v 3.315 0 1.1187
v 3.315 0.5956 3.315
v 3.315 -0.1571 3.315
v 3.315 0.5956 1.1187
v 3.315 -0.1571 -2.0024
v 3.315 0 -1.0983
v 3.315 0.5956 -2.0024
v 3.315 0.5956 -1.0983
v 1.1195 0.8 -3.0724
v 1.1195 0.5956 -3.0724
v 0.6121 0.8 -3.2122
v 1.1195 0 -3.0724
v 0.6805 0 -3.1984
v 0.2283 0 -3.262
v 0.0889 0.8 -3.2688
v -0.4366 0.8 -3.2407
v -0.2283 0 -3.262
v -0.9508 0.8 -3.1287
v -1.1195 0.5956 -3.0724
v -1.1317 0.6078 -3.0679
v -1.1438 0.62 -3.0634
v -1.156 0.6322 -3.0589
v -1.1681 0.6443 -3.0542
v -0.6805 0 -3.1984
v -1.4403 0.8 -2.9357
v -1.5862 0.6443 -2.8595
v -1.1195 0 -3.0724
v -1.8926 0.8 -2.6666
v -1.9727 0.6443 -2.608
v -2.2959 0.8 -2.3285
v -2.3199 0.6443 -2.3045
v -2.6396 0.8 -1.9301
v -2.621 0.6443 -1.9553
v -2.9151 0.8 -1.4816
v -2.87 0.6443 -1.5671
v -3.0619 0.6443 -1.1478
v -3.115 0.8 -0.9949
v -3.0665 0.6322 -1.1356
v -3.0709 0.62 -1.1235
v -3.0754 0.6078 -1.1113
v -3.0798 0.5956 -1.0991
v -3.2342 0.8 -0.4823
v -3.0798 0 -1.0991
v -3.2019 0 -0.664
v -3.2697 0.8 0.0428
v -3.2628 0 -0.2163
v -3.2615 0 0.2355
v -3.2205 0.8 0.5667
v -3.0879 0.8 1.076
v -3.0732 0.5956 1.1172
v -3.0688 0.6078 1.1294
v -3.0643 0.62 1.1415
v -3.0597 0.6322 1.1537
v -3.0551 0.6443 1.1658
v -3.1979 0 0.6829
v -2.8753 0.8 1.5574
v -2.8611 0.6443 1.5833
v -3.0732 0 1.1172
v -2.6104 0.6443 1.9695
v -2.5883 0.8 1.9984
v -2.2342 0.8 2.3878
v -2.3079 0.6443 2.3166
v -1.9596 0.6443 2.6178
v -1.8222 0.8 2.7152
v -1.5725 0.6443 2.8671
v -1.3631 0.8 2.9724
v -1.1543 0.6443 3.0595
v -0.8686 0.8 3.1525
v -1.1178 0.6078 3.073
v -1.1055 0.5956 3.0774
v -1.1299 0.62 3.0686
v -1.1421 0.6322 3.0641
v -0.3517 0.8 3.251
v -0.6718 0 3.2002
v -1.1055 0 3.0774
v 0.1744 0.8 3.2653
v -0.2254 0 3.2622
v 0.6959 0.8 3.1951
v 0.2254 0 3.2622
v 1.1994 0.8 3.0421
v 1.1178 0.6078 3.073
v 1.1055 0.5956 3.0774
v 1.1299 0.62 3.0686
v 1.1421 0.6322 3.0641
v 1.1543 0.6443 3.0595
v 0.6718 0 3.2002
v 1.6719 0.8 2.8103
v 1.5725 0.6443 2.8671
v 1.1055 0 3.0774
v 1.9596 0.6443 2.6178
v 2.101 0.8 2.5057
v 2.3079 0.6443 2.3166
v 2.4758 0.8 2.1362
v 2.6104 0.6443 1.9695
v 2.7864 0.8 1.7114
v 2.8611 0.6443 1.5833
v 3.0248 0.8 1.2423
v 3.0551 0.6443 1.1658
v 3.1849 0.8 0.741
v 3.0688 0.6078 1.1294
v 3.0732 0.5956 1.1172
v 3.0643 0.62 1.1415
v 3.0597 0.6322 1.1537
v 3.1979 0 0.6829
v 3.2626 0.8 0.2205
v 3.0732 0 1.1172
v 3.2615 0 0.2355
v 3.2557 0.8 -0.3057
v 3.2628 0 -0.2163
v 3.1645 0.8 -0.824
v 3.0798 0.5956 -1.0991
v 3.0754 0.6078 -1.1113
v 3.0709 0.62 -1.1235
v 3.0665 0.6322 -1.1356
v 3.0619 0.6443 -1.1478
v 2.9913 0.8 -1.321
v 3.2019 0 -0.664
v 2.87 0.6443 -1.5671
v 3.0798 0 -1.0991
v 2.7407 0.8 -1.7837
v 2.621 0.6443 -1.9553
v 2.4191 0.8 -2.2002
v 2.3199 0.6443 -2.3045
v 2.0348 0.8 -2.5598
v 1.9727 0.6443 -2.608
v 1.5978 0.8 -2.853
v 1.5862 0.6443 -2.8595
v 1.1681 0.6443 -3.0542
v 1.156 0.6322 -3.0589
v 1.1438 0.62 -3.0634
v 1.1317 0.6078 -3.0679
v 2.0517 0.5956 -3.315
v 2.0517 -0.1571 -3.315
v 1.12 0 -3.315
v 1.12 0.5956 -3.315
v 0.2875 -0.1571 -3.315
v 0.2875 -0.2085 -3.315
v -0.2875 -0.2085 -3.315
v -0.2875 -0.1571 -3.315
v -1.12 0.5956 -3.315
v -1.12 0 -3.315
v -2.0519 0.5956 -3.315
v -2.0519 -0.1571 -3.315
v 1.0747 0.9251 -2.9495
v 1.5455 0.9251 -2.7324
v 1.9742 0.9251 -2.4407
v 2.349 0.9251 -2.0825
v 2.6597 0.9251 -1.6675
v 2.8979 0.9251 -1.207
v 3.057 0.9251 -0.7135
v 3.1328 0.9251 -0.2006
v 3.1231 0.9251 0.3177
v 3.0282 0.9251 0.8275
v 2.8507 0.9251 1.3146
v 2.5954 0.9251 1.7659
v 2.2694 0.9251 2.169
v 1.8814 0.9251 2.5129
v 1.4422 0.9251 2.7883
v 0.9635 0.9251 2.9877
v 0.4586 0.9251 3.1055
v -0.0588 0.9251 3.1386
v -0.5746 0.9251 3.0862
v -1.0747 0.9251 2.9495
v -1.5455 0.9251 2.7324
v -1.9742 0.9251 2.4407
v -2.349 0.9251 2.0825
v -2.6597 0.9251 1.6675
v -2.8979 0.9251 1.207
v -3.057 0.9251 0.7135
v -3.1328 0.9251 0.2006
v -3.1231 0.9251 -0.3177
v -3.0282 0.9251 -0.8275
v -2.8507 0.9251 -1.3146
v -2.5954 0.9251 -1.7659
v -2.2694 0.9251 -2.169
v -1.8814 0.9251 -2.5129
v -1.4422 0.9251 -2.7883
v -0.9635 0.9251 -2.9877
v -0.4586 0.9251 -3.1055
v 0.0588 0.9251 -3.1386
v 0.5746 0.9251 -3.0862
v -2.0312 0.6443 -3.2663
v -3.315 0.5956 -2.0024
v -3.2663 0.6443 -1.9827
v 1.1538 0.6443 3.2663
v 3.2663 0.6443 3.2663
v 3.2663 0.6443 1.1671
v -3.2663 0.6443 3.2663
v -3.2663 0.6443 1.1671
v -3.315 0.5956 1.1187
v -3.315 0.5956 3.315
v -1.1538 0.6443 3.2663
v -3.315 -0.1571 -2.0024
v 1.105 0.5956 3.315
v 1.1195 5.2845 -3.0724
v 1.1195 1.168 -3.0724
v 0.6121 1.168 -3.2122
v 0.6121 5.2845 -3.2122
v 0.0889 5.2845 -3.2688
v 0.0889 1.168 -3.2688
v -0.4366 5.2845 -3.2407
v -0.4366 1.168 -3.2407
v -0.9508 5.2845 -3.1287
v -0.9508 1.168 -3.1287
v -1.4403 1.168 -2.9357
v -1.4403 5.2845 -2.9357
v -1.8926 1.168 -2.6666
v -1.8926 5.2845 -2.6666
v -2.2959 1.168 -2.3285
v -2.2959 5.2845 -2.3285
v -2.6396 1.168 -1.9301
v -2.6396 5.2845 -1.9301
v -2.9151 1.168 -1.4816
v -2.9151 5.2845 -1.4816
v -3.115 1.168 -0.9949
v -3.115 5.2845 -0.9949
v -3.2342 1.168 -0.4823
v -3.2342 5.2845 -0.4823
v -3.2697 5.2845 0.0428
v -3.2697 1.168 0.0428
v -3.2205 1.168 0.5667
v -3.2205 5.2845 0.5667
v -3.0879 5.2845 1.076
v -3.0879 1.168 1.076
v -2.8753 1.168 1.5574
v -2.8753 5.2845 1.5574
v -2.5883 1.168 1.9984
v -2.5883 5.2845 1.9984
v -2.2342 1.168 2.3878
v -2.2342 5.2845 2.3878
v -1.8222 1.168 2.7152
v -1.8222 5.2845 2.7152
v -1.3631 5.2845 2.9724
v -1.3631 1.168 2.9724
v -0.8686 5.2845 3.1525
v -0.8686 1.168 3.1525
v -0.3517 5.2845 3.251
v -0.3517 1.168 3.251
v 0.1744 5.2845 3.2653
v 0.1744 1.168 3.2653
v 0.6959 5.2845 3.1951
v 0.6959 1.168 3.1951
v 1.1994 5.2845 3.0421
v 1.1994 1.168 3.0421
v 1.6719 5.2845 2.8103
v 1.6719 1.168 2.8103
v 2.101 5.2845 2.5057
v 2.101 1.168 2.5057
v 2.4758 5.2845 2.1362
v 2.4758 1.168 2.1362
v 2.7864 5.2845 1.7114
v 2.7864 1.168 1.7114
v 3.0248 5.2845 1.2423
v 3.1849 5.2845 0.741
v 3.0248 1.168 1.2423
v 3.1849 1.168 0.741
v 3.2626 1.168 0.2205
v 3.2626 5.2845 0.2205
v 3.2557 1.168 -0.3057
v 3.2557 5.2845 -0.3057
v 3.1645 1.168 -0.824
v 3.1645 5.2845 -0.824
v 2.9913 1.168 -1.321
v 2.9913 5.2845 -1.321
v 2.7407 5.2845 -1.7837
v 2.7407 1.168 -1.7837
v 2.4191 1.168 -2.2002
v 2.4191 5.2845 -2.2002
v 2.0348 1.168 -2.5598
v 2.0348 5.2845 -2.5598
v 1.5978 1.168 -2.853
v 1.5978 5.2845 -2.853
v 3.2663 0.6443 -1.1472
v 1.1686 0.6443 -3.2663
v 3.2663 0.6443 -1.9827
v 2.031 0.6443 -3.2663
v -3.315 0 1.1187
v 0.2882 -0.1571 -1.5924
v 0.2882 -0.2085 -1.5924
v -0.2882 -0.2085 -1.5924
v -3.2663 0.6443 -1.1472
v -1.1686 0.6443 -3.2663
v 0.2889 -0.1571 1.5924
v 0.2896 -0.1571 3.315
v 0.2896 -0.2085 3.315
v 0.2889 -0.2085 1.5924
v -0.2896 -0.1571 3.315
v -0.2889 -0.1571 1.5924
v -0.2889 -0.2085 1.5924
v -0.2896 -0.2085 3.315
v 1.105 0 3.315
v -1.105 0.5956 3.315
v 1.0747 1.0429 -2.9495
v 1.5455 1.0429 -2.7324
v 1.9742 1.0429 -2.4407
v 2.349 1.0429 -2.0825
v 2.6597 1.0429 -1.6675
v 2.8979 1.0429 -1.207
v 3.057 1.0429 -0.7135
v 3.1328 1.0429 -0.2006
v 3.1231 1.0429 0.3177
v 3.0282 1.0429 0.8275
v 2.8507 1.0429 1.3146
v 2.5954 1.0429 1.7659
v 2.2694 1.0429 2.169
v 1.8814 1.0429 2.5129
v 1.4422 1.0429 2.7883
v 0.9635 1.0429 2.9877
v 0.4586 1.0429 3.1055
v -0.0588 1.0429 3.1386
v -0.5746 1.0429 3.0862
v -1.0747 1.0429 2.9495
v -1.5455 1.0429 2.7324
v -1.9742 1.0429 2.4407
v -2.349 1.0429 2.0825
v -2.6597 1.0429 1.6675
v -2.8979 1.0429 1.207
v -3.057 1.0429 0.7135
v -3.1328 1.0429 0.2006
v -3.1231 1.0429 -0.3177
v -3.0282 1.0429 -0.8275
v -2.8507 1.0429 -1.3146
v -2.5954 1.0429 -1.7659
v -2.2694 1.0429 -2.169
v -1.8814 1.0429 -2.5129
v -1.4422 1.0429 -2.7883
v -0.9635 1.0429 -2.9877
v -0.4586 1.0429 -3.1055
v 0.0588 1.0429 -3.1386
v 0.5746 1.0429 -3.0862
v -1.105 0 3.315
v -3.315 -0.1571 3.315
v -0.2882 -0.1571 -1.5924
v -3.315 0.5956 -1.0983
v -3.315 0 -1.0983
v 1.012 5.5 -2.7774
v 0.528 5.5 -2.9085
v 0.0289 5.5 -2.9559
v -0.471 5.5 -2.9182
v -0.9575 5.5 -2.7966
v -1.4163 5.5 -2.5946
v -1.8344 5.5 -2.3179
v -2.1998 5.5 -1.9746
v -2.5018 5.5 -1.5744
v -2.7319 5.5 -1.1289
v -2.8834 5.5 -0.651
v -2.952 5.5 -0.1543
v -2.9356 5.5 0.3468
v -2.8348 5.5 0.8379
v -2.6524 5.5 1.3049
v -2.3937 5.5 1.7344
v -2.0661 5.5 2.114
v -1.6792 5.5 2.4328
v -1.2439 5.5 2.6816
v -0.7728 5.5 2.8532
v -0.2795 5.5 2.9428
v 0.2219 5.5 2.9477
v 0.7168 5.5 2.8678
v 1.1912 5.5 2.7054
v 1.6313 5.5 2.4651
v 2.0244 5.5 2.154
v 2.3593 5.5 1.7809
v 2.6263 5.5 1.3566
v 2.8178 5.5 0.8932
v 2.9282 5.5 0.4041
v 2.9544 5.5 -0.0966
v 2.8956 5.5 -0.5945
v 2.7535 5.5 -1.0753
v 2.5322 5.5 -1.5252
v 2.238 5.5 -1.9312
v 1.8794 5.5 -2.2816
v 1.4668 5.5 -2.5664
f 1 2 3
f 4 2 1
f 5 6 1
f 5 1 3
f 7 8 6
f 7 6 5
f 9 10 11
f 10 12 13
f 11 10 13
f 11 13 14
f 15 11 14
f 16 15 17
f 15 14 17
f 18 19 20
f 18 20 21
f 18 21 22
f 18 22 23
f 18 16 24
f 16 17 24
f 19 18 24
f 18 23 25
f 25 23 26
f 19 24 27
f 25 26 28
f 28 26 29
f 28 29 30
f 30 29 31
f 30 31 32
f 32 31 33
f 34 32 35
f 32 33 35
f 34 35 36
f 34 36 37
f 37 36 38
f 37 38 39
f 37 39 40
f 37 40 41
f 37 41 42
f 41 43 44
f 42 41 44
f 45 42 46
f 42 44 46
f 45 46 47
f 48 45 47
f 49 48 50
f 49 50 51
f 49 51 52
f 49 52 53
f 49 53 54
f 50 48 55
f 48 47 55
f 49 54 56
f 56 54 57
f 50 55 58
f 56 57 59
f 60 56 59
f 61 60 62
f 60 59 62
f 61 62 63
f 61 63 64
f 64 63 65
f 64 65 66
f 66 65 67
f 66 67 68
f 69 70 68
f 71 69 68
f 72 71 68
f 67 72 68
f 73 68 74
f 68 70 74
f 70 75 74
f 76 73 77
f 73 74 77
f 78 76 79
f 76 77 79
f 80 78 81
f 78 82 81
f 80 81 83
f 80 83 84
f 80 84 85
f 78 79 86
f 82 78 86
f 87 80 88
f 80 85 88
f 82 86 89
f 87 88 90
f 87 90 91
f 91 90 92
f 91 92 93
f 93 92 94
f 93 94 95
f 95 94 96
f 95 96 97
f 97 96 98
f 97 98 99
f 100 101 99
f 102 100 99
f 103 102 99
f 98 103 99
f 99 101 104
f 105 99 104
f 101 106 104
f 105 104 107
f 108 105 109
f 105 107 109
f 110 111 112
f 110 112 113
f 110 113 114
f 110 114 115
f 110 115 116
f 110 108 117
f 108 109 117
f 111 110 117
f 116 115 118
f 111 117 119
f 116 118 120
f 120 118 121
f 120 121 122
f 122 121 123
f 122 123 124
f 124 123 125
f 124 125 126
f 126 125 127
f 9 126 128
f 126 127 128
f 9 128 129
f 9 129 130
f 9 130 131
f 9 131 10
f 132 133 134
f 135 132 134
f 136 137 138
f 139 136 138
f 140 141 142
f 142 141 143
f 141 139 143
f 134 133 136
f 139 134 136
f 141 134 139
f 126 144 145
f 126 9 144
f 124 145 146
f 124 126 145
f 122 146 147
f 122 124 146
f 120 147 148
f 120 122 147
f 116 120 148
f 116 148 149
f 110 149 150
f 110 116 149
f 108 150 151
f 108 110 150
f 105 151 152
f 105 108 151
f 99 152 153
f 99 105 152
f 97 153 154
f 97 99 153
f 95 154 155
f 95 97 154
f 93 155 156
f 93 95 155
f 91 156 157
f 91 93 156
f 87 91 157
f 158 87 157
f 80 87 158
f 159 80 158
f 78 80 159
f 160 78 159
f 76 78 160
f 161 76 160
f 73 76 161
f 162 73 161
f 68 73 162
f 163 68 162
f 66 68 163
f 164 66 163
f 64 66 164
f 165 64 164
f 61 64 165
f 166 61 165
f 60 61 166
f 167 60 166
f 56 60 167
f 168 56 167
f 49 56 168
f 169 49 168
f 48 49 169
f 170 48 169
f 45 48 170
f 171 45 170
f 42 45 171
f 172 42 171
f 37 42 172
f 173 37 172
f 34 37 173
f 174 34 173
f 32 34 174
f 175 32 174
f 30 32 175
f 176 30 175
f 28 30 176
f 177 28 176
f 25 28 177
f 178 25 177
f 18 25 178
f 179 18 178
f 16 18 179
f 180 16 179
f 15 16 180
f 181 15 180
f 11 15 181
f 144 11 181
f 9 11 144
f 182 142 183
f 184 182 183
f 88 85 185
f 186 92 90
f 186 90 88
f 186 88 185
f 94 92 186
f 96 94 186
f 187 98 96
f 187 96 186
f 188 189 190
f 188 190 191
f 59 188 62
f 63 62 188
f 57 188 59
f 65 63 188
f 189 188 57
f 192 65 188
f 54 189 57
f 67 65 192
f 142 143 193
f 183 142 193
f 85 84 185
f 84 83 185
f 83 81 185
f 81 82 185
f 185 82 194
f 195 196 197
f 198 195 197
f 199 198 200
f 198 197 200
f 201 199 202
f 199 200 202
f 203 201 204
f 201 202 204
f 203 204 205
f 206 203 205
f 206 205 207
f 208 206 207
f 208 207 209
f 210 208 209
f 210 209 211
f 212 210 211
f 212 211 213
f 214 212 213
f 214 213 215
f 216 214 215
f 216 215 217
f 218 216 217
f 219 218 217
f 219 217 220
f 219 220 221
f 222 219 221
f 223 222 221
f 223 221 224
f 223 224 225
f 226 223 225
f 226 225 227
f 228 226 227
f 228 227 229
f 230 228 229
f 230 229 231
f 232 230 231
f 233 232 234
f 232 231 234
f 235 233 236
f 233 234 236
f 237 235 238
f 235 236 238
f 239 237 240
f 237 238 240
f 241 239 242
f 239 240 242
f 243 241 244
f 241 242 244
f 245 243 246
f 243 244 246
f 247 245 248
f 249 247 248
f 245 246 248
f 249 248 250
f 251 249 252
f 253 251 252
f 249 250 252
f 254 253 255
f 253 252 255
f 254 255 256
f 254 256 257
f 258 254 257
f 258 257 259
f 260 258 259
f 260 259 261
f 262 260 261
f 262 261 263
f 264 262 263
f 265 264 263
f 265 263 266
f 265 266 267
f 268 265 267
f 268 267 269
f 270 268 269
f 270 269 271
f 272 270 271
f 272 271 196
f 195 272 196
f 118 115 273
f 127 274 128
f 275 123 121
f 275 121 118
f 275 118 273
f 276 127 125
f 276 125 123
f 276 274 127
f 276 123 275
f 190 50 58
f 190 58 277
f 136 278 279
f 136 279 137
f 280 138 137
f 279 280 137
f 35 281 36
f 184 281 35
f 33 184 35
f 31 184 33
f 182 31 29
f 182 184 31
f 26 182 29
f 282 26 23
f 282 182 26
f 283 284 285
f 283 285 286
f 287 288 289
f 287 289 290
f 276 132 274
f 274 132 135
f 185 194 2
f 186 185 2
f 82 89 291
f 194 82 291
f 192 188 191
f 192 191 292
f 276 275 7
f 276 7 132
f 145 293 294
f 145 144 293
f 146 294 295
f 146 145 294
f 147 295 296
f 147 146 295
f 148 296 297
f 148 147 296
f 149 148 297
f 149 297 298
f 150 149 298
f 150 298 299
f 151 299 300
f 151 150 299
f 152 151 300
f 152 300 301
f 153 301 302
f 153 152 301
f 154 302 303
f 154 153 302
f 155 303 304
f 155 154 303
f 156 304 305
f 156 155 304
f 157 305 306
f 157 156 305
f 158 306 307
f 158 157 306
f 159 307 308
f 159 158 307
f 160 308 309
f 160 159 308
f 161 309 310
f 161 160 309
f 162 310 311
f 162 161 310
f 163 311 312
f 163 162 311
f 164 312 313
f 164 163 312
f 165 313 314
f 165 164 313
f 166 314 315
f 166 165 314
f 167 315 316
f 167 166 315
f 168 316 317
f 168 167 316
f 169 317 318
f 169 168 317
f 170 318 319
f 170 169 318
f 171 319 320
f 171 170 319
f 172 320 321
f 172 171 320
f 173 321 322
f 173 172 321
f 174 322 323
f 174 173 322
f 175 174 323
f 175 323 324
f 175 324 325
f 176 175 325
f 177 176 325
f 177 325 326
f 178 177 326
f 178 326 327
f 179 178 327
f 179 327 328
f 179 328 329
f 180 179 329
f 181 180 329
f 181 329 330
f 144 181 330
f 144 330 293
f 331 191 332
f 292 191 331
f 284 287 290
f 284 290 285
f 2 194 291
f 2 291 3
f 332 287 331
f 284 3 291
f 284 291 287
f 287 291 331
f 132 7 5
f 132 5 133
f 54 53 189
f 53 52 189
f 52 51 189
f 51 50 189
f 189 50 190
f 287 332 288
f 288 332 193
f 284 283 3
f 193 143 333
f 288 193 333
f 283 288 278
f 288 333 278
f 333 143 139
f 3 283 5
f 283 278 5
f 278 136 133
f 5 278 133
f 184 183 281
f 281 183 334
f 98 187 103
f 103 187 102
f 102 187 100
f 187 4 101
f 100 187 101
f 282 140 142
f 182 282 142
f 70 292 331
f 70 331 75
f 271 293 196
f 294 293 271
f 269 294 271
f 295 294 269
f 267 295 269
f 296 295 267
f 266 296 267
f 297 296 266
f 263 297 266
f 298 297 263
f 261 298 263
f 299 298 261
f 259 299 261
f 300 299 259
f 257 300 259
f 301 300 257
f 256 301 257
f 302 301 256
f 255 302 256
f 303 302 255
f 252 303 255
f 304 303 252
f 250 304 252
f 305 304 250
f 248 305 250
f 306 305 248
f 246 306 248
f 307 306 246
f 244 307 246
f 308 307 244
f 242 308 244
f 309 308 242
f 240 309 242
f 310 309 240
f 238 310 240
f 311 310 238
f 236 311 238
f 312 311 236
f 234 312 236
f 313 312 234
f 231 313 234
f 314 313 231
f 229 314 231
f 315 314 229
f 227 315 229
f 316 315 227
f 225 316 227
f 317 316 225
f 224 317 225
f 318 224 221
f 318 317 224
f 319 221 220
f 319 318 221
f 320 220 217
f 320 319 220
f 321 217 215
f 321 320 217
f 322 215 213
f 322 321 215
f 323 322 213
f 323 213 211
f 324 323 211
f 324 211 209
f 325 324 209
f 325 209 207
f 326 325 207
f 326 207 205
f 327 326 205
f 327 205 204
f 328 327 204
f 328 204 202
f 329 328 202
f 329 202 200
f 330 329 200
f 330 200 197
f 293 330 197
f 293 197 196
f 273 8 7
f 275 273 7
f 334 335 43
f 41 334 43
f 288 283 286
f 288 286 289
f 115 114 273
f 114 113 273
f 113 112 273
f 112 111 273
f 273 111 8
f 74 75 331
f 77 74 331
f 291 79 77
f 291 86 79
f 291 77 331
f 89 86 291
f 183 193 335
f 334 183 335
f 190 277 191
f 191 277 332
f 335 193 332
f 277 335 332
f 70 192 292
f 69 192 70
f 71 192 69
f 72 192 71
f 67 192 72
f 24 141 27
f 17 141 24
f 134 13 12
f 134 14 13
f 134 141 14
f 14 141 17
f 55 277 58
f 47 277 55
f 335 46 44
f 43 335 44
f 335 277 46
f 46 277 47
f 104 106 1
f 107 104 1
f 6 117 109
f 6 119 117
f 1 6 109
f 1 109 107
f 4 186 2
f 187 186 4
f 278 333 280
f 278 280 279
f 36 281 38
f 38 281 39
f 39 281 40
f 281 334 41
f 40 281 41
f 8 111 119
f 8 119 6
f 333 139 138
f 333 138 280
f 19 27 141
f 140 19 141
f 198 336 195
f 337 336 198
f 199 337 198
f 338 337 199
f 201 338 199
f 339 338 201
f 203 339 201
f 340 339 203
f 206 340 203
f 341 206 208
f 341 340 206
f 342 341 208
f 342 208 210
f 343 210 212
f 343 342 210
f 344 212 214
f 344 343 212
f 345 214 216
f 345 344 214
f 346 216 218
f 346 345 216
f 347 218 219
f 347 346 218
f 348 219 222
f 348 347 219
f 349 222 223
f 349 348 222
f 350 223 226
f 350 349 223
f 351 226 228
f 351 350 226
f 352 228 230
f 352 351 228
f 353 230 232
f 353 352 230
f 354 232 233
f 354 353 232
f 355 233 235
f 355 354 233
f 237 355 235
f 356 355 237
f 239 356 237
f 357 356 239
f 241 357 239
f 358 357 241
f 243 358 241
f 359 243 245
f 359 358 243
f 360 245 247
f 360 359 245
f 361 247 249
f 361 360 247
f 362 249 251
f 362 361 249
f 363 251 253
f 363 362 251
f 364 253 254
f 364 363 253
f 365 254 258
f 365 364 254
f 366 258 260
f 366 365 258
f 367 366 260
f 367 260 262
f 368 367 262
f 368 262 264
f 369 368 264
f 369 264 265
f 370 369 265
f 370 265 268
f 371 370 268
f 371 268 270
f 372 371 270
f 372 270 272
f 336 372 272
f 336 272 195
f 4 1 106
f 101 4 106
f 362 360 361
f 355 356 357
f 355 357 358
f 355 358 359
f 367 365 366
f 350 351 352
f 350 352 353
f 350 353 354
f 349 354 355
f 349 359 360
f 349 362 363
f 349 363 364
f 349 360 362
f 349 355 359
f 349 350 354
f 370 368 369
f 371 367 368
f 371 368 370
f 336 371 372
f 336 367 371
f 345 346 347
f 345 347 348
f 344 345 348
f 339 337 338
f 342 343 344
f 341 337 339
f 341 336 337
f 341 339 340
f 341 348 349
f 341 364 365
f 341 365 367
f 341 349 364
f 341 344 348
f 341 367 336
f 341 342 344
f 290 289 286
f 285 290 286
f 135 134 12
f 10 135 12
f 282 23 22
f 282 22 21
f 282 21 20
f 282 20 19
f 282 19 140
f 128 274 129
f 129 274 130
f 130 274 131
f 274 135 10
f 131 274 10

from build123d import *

# Parameters (mm, degrees)
BOSS_EXTRUDE1_DEPTH = 0.1571
BOSS_EXTRUDE2_DEPTH = 0.6443
CHAMFER1_SIZE       = 0.0487
BOSS_EXTRUDE3_START = -0.1571
BOSS_EXTRUDE3_DEPTH = 0.0514
SKETCH2_R           = 3.27
BOSS_EXTRUDE4_DEPTH = 5.5
CHAMFER2_SIZE       = 0.2155
CHAMFER2_SIZE2      = 0.314


with BuildPart() as part:
    # Sketch1 → Boss-Extrude1 (new body)
    with BuildSketch(Plane(origin=(0, 0, 0), x_dir=(1, 0, 0), z_dir=(0, 1, 0))):
        Polygon((-1.115015984, 1.105000019), (-1.120023966, 3.314999898), (-2.051918983, 3.314999898), (-3.314999898, 2.002368291), (-3.314999898, 1.098344008), align=None)
        Polygon((0, -1.592377345), (0, 1.592377345), (-0.288244069, 1.592377345), (-0.28754435, 3.314999898), (-1.120023966, 3.314999898), (-1.115015984, 1.105000019), (-3.314999898, 1.098344008), (-3.314999898, -1.118712743), (-1.110008001, -1.105000019), (-1.105000019, -3.314999898), (-0.289643526, -3.314999898), (-0.288943807, -1.592377345), align=None)
        Polygon((-3.314999898, -3.314999898), (-1.105000019, -3.314999898), (-1.110008001, -1.105000019), (-3.314999898, -1.118712743), align=None)
        Polygon((0.288943807, -1.592377345), (0, -1.592377345), (0, -3.314999898), (0.289643526, -3.314999898), align=None)
        Polygon((0, -3.314999898), (0, -1.592377345), (-0.288943807, -1.592377345), (-0.289643526, -3.314999898), align=None)
        Polygon((0, 1.592377345), (0, 3.314999898), (-0.28754435, 3.314999898), (-0.288244069, 1.592377345), align=None)
        Polygon((0.28754435, 3.314999898), (0, 3.314999898), (0, 1.592377345), (0.288244069, 1.592377345), align=None)
        Polygon((0.288244069, 1.592377345), (0, 1.592377345), (0, -1.592377345), (0.288943807, -1.592377345), (0.289643526, -3.314999898), (1.105000019, -3.314999898), (1.110008001, -1.10500002), (3.314999898, -1.118712743), (3.314999898, 1.098344008), (1.115015984, 1.105000019), (1.120023966, 3.314999898), (0.28754435, 3.314999898), align=None)
        Polygon((2.051671346, 3.314999898), (1.120023966, 3.314999898), (1.115015984, 1.105000019), (3.314999898, 1.098344008), (3.314999898, 2.002368291), align=None)
        Polygon((1.110008001, -1.10500002), (1.105000019, -3.314999898), (3.314999898, -3.314999898), (3.314999898, -1.118712743), align=None)
    extrude(amount=-BOSS_EXTRUDE1_DEPTH)

    # Sketch1<4> → Boss-Extrude2 (add)
    with BuildSketch(Plane(origin=(0, 0, 0), x_dir=(1, 0, 0), z_dir=(0, 1, 0))):
        Polygon((-1.115015984, 1.105000019), (-1.120023966, 3.314999898), (-2.051918983, 3.314999898), (-3.314999898, 2.002368291), (-3.314999898, 1.098344008), align=None)
        Polygon((-3.314999898, -3.314999898), (-1.105000019, -3.314999898), (-1.110008001, -1.105000019), (-3.314999898, -1.118712743), align=None)
        Polygon((1.115015984, 1.105000019), (3.314999898, 1.098344008), (3.314999898, 2.002368291), (2.051671346, 3.314999898), (1.120023966, 3.314999898), align=None)
        Polygon((1.105000019, -3.314999898), (3.314999898, -3.314999898), (3.314999898, -1.118712743), (1.110008001, -1.10500002), align=None)
    extrude(amount=BOSS_EXTRUDE2_DEPTH)

    # Chamfer1
    chamfer1_edges = [part.edges().sort_by_distance(p)[0] for p in [
        (2.212503949, 0.6443, 1.111856381),
        (3.314999898, 0.6443, 2.216856321),
        (2.209999959, 0.6443, 3.314999898),
        (1.10750401, 0.6443, 2.209999959),
        (1.117519975, 0.6443, -2.209999959),
        (1.585847656, 0.6443, -3.314999898),
        (2.683335622, 0.6443, -2.658684095),
        (3.314999898, 0.6443, -1.55035615),
        (2.215007941, 0.6443, -1.101672014),
        (-2.215007941, 0.6443, -1.101672014),
        (-3.314999898, 0.6443, -1.55035615),
        (-2.683459441, 0.6443, -2.658684095),
        (-1.585971475, 0.6443, -3.314999898),
        (-1.117519975, 0.6443, -2.209999959),
        (-2.209999959, 0.6443, 3.314999898),
        (-3.314999898, 0.6443, 2.216856321),
        (-2.21250395, 0.6443, 1.111856381),
        (-1.10750401, 0.6443, 2.209999959),
    ]]
    chamfer(chamfer1_edges, length=CHAMFER1_SIZE)

    # Sketch1<5> → Boss-Extrude3 (add)
    with BuildSketch(Plane(origin=(0, 0, 0), x_dir=(1, 0, 0), z_dir=(0, 1, 0)).offset(BOSS_EXTRUDE3_START)):
        Polygon((0, -3.314999898), (0, -1.592377345), (-0.288943807, -1.592377345), (-0.289643526, -3.314999898), align=None)
        Polygon((0.288943807, -1.592377345), (0, -1.592377345), (0, -3.314999898), (0.289643526, -3.314999898), align=None)
        Polygon((0, 1.592377345), (0, 3.314999898), (-0.28754435, 3.314999898), (-0.288244069, 1.592377345), align=None)
        Polygon((0.28754435, 3.314999898), (0, 3.314999898), (0, 1.592377345), (0.288244069, 1.592377345), align=None)
    extrude(amount=-BOSS_EXTRUDE3_DEPTH)

    # Sketch2 → Boss-Extrude4 (add)
    with BuildSketch(Plane(origin=(0, 0, 0), x_dir=(1, 0, 0), z_dir=(0, 1, 0))):
        with Locations(Location((0, 0, 0), (0, 0, 69.980077841))):
            Circle(SKETCH2_R)
    extrude(amount=BOSS_EXTRUDE4_DEPTH)

    # Chamfer2
    chamfer2_edges = [part.edges().sort_by_distance(p)[0] for p in [
        (-1.119474234, 5.5, 3.072405806),
    ]]
    chamfer2_side = [part.faces().sort_by_distance(p)[0] for p in [
        (-1.119474234, 2.75, 3.072405806),
    ]]
    chamfer(chamfer2_edges, length=CHAMFER2_SIZE, length2=CHAMFER2_SIZE2, reference=chamfer2_side[0])

    # Sketch3 → Cut-Revolve1 (revolve, cut)
    with BuildSketch(Plane.XY, mode=Mode.PRIVATE) as cut_revolve1_sk:
        Polygon((3.1392, 1.0429), (3.1392, 0.9251), (3.27, 0.8), (3.27, 1.168), align=None)
    revolve(cut_revolve1_sk.sketch.rotate(Axis((0, 5.2845, 0), (0, -1, 0)), 290.019922159), axis=Axis((0, 5.2845, 0), (0, -1, 0)), mode=Mode.SUBTRACT)


solid = part.part
